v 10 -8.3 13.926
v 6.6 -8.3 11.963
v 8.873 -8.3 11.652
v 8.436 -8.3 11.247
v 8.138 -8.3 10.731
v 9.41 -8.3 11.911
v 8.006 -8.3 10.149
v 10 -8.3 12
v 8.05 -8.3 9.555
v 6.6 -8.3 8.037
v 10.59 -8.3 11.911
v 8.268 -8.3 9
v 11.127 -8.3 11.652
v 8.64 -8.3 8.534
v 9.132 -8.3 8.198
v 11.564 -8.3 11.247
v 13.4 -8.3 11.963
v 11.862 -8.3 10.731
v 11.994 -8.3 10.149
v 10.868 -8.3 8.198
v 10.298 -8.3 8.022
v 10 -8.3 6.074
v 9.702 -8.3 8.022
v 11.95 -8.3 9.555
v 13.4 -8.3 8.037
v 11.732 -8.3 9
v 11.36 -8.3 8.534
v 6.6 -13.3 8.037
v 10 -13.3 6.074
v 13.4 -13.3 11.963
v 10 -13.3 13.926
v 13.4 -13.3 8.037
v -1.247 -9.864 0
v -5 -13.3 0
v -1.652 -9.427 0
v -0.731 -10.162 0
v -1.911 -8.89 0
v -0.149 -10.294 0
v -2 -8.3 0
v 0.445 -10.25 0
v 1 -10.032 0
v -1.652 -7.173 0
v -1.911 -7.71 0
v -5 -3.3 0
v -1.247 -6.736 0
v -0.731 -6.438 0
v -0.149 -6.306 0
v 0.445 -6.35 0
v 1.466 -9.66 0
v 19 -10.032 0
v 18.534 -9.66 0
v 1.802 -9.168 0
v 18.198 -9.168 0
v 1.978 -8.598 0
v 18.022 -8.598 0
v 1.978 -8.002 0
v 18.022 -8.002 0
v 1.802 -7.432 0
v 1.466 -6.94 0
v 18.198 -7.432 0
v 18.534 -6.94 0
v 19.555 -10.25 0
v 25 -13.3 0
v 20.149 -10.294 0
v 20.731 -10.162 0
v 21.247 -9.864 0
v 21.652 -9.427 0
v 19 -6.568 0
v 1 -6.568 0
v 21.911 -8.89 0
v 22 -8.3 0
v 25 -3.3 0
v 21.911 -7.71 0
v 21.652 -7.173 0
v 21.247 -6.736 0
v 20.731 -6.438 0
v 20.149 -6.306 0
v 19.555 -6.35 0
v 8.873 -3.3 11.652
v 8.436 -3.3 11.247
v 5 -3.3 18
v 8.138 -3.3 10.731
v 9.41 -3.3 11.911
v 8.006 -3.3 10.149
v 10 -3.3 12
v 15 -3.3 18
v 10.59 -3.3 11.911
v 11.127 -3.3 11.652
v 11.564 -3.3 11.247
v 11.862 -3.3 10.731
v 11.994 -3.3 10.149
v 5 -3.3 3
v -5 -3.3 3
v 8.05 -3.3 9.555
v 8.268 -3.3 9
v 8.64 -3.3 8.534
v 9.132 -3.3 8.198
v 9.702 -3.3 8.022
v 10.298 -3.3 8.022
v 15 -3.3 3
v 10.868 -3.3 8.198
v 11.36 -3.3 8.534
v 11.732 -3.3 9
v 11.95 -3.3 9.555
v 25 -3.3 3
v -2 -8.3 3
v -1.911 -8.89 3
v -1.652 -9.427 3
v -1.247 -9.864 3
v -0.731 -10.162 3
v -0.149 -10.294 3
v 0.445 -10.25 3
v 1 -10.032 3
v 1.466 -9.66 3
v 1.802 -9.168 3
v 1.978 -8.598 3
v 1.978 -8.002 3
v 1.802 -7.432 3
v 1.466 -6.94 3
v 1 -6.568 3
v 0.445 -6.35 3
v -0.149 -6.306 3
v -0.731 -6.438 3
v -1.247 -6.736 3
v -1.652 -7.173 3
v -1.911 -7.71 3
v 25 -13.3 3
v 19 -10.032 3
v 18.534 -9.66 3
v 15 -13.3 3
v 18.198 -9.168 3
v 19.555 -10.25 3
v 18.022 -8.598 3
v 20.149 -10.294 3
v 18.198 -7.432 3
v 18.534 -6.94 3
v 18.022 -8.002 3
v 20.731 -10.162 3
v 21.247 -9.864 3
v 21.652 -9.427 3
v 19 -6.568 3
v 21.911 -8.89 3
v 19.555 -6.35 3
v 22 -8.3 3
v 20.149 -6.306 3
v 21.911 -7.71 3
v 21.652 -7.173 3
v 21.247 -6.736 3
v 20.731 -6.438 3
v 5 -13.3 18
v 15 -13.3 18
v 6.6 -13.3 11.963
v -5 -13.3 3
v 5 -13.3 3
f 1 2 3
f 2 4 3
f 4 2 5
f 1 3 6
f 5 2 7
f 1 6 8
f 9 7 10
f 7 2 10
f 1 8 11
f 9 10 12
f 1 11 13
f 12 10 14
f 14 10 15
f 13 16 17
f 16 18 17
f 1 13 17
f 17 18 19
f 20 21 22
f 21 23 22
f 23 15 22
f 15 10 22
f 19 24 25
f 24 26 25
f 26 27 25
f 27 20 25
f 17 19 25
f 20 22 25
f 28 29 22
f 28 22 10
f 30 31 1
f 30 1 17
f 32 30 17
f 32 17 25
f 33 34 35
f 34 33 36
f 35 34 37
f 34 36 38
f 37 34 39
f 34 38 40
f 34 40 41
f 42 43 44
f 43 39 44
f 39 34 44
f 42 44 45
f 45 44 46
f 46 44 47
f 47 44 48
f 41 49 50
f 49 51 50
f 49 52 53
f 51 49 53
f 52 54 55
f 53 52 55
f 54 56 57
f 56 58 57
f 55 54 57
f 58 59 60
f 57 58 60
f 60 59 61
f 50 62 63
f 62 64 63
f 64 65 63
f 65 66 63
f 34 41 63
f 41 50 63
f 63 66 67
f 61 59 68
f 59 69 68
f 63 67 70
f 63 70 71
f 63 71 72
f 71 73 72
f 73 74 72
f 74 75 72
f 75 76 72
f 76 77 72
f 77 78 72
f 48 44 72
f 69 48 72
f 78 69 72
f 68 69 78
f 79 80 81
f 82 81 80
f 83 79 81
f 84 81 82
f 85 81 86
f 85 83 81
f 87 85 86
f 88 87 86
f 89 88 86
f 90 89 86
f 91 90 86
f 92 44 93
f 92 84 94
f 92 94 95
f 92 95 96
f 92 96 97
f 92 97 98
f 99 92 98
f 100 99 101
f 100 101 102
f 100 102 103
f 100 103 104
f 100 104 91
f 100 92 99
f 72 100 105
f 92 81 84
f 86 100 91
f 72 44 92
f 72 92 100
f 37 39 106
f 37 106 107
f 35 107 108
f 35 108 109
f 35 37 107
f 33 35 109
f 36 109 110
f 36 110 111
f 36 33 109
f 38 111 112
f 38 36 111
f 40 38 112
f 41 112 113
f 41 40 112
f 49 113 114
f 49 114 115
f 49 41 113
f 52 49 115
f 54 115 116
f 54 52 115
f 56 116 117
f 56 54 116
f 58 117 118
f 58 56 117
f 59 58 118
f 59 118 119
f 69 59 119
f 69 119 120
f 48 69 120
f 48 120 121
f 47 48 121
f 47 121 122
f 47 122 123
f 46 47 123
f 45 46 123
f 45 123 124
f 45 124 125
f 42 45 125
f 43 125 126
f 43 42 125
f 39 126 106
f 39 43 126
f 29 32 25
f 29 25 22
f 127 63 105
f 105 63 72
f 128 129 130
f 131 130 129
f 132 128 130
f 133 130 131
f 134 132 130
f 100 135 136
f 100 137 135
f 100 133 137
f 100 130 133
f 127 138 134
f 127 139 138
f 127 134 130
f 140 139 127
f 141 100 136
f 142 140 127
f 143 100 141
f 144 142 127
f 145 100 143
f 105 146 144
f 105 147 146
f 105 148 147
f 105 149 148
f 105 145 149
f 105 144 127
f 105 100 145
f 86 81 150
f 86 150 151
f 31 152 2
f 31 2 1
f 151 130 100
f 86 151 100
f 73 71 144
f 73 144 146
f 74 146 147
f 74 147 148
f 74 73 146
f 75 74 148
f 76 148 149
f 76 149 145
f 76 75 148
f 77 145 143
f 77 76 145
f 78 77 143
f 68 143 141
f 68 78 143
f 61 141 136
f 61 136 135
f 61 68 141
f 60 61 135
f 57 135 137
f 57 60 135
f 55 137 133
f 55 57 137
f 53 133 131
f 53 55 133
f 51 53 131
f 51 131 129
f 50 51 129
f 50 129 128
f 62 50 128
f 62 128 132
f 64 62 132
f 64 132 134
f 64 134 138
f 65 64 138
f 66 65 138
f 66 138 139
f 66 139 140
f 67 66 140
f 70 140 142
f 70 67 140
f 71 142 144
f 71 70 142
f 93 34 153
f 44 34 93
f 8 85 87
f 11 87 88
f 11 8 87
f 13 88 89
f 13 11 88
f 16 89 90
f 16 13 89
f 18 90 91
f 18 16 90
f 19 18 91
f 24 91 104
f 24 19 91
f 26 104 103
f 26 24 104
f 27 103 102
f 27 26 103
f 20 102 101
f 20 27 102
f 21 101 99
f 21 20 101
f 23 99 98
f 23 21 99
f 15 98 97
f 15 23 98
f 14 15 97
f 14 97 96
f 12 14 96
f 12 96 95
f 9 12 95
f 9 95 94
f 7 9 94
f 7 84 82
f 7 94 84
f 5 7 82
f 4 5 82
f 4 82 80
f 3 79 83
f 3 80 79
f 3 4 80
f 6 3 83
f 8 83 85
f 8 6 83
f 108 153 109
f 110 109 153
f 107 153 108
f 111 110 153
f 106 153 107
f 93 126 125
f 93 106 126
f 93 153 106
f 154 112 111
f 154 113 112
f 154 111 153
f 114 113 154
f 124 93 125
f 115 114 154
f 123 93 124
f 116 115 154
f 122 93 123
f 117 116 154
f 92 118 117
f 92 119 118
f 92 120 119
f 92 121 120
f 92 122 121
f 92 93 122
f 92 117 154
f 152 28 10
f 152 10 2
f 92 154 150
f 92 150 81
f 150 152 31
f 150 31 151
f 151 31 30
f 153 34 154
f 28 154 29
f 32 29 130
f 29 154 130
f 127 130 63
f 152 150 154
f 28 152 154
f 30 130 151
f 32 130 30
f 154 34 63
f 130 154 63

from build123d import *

# Parameters (mm, degrees)
SKETCH1_W               = 30
SKETCH1_H               = 10
SKETCH1_R               = 2
BOSS_EXTRUDE1_DEPTH     = 3
SKETCH2_W               = 10
SKETCH2_H               = 10
BOSS_EXTRUDE2_DEPTH     = 15
CUT_EXTRUDE1_START      = -10
SKETCH3_R               = 2
CUT_EXTRUDE1_DEPTH      = 5
CUT_EXTRUDE2_DEPTH      = 33.388269481
CUT_EXTRUDE2_DEPTH_BACK = 33.388269481
SKETCH3_2_R             = 2


with BuildPart() as part:
    # Sketch1 → Boss-Extrude1 (new body)
    with BuildSketch(Plane.XY):
        with Locations((10, -8.3)):
            Rectangle(SKETCH1_W, SKETCH1_H)
        with Locations((20, -8.3)):
            Circle(SKETCH1_R, mode=Mode.SUBTRACT)
        with Locations(Location((0, -8.3, 0), (0, 0, 180))):
            Circle(SKETCH1_R, mode=Mode.SUBTRACT)
    extrude(amount=BOSS_EXTRUDE1_DEPTH)

    # Sketch2 → Boss-Extrude2 (add)
    with BuildSketch(Plane.XY.offset(3)):
        with Locations((10, -8.3)):
            Rectangle(SKETCH2_W, SKETCH2_H)
    extrude(amount=BOSS_EXTRUDE2_DEPTH)

    # Sketch3 → Cut-Extrude1 (cut)
    with BuildSketch(Plane(origin=(0, -3.3, 0), x_dir=(1, 0, 0), z_dir=(0, 1, 0)).offset(CUT_EXTRUDE1_START)):
        Polygon((10, -6.07401817), (6.6, -8.037009085), (6.6, -11.962990915), (10, -13.92598183), (13.4, -11.962990915), (13.4, -8.037009085), align=None)
        with Locations(Location((10, -10, 0), (0, 0, 270))):
            Circle(SKETCH3_R, mode=Mode.SUBTRACT)
    extrude(amount=CUT_EXTRUDE1_DEPTH, mode=Mode.SUBTRACT)

    # Sketch3<2> → Cut-Extrude2 (cut, two sides: drawn at the far end of the back side and taken through both)
    with BuildSketch(Plane(origin=(0, -3.3, 0), x_dir=(1, 0, 0), z_dir=(0, 1, 0)).offset(-CUT_EXTRUDE2_DEPTH_BACK)):
        with Locations(Location((10, -10, 0), (0, 0, 270))):
            Circle(SKETCH3_2_R)
    extrude(amount=CUT_EXTRUDE2_DEPTH + CUT_EXTRUDE2_DEPTH_BACK, mode=Mode.SUBTRACT)


solid = part.part
